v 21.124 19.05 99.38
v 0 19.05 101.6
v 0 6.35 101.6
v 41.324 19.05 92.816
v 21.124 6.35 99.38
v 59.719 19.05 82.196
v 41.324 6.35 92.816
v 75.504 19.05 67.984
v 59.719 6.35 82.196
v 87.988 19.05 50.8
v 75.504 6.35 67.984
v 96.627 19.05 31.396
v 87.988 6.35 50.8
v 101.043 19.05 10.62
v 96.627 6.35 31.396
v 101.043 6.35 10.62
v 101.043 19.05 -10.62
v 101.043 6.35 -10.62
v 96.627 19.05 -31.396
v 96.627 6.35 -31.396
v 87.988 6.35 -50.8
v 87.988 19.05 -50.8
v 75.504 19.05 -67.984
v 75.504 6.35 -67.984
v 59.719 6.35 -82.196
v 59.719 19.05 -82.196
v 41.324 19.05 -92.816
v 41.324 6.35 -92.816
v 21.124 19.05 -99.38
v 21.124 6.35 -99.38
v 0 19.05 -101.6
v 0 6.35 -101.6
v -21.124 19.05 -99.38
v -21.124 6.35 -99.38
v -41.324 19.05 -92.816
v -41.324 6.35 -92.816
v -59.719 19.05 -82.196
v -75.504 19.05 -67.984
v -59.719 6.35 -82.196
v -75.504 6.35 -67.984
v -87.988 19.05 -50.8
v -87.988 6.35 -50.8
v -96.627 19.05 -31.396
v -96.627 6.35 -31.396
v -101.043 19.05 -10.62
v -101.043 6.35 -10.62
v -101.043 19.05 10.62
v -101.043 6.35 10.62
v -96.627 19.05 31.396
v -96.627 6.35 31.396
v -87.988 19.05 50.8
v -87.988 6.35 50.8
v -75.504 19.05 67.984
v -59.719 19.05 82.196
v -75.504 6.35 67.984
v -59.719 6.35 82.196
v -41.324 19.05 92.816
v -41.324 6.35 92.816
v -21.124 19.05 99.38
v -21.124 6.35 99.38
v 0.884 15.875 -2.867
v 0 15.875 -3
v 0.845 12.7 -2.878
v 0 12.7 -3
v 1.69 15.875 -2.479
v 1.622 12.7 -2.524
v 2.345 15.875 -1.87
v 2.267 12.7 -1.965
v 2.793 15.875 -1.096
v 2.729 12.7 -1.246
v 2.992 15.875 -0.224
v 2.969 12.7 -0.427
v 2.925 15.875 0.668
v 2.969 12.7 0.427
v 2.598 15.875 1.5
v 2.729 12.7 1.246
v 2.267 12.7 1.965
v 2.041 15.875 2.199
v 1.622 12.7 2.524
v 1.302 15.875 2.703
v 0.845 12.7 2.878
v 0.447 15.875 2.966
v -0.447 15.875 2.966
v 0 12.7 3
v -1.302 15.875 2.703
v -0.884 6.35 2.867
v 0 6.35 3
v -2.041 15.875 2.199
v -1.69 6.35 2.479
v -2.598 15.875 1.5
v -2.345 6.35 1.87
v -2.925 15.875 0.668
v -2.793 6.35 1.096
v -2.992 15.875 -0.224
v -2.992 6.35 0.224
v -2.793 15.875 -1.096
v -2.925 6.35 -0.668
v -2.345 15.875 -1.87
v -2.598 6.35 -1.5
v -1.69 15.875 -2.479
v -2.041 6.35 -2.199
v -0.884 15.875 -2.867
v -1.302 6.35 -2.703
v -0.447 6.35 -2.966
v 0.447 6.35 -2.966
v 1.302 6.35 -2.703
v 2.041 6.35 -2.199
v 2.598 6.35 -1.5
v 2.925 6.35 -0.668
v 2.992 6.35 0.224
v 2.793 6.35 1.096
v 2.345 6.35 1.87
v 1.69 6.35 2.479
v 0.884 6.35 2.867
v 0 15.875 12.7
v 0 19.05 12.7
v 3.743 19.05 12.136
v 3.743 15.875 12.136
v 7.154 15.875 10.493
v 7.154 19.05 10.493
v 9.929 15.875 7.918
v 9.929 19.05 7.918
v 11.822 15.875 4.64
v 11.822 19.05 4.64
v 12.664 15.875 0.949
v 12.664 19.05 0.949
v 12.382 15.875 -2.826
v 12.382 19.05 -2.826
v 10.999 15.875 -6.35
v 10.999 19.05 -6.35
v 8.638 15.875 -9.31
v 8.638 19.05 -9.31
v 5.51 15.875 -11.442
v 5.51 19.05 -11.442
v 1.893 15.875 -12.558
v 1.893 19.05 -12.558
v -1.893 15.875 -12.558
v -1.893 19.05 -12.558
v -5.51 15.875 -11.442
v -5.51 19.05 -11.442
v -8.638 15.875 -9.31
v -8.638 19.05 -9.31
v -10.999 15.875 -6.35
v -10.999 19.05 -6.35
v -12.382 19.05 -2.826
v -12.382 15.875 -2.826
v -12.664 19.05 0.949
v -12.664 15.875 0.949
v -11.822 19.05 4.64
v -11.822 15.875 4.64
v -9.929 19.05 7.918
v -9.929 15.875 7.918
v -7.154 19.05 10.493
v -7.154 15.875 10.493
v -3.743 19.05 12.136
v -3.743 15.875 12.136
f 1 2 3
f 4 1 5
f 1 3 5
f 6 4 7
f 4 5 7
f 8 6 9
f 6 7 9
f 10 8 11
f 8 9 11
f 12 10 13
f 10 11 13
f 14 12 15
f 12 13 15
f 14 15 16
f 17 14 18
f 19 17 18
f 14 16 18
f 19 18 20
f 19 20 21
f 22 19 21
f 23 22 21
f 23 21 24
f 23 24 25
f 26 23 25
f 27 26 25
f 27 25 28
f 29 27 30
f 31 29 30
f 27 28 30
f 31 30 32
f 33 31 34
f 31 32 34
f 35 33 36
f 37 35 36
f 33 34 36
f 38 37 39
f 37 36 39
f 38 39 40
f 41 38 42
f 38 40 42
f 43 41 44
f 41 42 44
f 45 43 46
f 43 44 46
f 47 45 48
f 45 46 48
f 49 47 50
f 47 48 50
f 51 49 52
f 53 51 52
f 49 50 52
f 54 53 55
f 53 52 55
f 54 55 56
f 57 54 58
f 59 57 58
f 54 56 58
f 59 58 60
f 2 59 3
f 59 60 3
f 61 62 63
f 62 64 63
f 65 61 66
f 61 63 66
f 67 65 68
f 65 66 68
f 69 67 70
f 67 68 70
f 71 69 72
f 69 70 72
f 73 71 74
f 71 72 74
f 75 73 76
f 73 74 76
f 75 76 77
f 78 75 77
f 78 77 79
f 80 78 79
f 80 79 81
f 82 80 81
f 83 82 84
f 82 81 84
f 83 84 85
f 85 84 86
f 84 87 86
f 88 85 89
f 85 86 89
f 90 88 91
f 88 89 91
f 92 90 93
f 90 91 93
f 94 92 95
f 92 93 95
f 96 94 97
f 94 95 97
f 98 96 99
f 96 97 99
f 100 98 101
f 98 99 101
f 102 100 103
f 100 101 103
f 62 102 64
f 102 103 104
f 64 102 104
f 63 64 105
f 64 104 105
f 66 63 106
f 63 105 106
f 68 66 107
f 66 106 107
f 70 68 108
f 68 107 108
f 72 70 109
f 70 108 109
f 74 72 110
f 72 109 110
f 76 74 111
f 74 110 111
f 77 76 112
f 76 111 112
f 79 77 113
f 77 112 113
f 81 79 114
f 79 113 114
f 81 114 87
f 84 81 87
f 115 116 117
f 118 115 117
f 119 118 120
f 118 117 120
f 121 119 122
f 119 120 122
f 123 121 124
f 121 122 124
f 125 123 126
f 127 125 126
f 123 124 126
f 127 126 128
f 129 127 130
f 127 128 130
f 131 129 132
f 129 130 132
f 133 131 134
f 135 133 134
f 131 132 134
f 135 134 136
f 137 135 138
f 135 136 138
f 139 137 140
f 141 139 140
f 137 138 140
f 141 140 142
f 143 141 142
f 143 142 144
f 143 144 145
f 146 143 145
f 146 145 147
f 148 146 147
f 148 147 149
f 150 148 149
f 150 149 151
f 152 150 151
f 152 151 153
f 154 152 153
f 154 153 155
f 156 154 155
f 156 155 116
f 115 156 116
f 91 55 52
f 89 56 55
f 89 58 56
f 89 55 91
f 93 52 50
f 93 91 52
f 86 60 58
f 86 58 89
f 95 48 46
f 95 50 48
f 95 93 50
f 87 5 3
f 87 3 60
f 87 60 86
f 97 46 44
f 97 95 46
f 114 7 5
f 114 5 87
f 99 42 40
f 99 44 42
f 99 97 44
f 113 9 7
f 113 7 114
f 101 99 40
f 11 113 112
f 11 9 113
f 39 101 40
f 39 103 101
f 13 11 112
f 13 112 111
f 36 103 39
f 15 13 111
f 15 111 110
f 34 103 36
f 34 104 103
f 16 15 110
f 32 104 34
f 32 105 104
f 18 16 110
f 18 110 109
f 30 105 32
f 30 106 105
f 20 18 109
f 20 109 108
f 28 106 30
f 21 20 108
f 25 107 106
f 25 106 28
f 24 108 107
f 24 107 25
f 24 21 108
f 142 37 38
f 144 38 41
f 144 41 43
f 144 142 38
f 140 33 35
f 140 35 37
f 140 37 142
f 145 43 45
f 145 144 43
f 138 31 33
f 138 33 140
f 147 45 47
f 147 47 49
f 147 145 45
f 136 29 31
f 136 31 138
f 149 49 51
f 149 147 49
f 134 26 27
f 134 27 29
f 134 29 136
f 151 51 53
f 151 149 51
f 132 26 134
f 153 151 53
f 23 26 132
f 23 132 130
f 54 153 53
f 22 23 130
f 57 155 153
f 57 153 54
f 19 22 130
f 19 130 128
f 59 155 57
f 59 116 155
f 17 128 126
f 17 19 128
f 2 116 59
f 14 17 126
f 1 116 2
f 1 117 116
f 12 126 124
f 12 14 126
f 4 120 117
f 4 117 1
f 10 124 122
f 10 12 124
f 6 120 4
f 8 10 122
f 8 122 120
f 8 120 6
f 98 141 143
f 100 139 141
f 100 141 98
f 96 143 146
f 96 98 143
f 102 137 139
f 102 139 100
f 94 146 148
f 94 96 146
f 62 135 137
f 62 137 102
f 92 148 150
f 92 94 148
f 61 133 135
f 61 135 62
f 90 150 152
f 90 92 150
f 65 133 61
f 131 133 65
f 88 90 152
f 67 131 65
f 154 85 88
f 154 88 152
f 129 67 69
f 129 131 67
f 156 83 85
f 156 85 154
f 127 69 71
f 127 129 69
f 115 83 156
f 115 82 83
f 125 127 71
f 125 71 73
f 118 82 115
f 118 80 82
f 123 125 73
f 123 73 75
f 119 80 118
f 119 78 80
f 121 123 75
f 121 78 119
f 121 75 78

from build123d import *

# Parameters (mm, degrees)
SKETCH1_R           = 101.6
SKETCH1_R_2         = 3
BOSS_EXTRUDE1_DEPTH = 12.7
SKETCH7_R           = 101.6
SKETCH7_R_2         = 3
BOSS_EXTRUDE3_DEPTH = 6.35
SKETCH8_R           = 12.7
CUT_EXTRUDE1_DEPTH  = 6.35
CUT_EXTRUDE2_START  = -6.35
SKETCH9_R           = 12.7
CUT_EXTRUDE2_DEPTH  = 6.35
SKETCH10_R          = 101.6
CUT_EXTRUDE3_DEPTH  = 6.35
BOSS_EXTRUDE4_START = 3.175
SKETCH12_R          = 12.7
BOSS_EXTRUDE4_DEPTH = 3.175
SKETCH13_R          = 3
CUT_EXTRUDE6_DEPTH  = 3.175


with BuildPart() as part:
    # Sketch1 → Boss-Extrude1 (new body)
    with BuildSketch(Plane(origin=(0, 0, 0), x_dir=(1, 0, 0), z_dir=(0, 1, 0))):
        with Locations(Location((0, 0, 0), (0, 0, 270))):
            Circle(SKETCH1_R)
        with Locations(Location((0, 0, 0), (0, 0, 270))):
            Circle(SKETCH1_R_2, mode=Mode.SUBTRACT)
    extrude(amount=BOSS_EXTRUDE1_DEPTH)

    # Sketch7 → Boss-Extrude3 (add)
    with BuildSketch(Plane(origin=(0, 12.7, 0), x_dir=(1, 0, 0), z_dir=(0, 1, 0))):
        with Locations(Location((0, 0, 0), (0, 0, 270))):
            Circle(SKETCH7_R)
        with Locations(Location((0, 0, 0), (0, 0, 270))):
            Circle(SKETCH7_R_2, mode=Mode.SUBTRACT)
    extrude(amount=BOSS_EXTRUDE3_DEPTH)

    # Sketch8 → Cut-Extrude1 (cut)
    with BuildSketch(Plane(origin=(0, 19.05, 0), x_dir=(1, 0, 0), z_dir=(0, 1, 0))):
        with Locations(Location((0, 0, 0), (0, 0, 270))):
            Circle(SKETCH8_R)
    extrude(amount=-CUT_EXTRUDE1_DEPTH, mode=Mode.SUBTRACT)

    # Sketch9 → Cut-Extrude2 (cut)
    with BuildSketch(Plane.XZ.offset(CUT_EXTRUDE2_START)):
        with Locations(Location((0, 0, 0), (0, 0, 90))):
            Circle(SKETCH9_R)
    extrude(amount=CUT_EXTRUDE2_DEPTH, mode=Mode.SUBTRACT)

    # Sketch10 → Cut-Extrude3 (cut)
    with BuildSketch(Plane.XZ):
        with Locations(Location((0, 0, 0), (0, 0, 270))):
            Circle(SKETCH10_R)
    extrude(amount=-CUT_EXTRUDE3_DEPTH, mode=Mode.SUBTRACT)

    # Sketch12 → Boss-Extrude4 (add)
    with BuildSketch(Plane(origin=(0, 12.7, 0), x_dir=(1, 0, 0), z_dir=(0, 1, 0)).offset(BOSS_EXTRUDE4_START)):
        with Locations(Location((0, 0, 0), (0, 0, 270))):
            Circle(SKETCH12_R)
    extrude(amount=-BOSS_EXTRUDE4_DEPTH)

    # Sketch13 → Cut-Extrude6 (cut)
    with BuildSketch(Plane.XZ.offset(-12.7)):
        with Locations(Location((0, 0, 0), (0, 0, 270))):
            Circle(SKETCH13_R)
    extrude(amount=-CUT_EXTRUDE6_DEPTH, mode=Mode.SUBTRACT)


solid = part.part
